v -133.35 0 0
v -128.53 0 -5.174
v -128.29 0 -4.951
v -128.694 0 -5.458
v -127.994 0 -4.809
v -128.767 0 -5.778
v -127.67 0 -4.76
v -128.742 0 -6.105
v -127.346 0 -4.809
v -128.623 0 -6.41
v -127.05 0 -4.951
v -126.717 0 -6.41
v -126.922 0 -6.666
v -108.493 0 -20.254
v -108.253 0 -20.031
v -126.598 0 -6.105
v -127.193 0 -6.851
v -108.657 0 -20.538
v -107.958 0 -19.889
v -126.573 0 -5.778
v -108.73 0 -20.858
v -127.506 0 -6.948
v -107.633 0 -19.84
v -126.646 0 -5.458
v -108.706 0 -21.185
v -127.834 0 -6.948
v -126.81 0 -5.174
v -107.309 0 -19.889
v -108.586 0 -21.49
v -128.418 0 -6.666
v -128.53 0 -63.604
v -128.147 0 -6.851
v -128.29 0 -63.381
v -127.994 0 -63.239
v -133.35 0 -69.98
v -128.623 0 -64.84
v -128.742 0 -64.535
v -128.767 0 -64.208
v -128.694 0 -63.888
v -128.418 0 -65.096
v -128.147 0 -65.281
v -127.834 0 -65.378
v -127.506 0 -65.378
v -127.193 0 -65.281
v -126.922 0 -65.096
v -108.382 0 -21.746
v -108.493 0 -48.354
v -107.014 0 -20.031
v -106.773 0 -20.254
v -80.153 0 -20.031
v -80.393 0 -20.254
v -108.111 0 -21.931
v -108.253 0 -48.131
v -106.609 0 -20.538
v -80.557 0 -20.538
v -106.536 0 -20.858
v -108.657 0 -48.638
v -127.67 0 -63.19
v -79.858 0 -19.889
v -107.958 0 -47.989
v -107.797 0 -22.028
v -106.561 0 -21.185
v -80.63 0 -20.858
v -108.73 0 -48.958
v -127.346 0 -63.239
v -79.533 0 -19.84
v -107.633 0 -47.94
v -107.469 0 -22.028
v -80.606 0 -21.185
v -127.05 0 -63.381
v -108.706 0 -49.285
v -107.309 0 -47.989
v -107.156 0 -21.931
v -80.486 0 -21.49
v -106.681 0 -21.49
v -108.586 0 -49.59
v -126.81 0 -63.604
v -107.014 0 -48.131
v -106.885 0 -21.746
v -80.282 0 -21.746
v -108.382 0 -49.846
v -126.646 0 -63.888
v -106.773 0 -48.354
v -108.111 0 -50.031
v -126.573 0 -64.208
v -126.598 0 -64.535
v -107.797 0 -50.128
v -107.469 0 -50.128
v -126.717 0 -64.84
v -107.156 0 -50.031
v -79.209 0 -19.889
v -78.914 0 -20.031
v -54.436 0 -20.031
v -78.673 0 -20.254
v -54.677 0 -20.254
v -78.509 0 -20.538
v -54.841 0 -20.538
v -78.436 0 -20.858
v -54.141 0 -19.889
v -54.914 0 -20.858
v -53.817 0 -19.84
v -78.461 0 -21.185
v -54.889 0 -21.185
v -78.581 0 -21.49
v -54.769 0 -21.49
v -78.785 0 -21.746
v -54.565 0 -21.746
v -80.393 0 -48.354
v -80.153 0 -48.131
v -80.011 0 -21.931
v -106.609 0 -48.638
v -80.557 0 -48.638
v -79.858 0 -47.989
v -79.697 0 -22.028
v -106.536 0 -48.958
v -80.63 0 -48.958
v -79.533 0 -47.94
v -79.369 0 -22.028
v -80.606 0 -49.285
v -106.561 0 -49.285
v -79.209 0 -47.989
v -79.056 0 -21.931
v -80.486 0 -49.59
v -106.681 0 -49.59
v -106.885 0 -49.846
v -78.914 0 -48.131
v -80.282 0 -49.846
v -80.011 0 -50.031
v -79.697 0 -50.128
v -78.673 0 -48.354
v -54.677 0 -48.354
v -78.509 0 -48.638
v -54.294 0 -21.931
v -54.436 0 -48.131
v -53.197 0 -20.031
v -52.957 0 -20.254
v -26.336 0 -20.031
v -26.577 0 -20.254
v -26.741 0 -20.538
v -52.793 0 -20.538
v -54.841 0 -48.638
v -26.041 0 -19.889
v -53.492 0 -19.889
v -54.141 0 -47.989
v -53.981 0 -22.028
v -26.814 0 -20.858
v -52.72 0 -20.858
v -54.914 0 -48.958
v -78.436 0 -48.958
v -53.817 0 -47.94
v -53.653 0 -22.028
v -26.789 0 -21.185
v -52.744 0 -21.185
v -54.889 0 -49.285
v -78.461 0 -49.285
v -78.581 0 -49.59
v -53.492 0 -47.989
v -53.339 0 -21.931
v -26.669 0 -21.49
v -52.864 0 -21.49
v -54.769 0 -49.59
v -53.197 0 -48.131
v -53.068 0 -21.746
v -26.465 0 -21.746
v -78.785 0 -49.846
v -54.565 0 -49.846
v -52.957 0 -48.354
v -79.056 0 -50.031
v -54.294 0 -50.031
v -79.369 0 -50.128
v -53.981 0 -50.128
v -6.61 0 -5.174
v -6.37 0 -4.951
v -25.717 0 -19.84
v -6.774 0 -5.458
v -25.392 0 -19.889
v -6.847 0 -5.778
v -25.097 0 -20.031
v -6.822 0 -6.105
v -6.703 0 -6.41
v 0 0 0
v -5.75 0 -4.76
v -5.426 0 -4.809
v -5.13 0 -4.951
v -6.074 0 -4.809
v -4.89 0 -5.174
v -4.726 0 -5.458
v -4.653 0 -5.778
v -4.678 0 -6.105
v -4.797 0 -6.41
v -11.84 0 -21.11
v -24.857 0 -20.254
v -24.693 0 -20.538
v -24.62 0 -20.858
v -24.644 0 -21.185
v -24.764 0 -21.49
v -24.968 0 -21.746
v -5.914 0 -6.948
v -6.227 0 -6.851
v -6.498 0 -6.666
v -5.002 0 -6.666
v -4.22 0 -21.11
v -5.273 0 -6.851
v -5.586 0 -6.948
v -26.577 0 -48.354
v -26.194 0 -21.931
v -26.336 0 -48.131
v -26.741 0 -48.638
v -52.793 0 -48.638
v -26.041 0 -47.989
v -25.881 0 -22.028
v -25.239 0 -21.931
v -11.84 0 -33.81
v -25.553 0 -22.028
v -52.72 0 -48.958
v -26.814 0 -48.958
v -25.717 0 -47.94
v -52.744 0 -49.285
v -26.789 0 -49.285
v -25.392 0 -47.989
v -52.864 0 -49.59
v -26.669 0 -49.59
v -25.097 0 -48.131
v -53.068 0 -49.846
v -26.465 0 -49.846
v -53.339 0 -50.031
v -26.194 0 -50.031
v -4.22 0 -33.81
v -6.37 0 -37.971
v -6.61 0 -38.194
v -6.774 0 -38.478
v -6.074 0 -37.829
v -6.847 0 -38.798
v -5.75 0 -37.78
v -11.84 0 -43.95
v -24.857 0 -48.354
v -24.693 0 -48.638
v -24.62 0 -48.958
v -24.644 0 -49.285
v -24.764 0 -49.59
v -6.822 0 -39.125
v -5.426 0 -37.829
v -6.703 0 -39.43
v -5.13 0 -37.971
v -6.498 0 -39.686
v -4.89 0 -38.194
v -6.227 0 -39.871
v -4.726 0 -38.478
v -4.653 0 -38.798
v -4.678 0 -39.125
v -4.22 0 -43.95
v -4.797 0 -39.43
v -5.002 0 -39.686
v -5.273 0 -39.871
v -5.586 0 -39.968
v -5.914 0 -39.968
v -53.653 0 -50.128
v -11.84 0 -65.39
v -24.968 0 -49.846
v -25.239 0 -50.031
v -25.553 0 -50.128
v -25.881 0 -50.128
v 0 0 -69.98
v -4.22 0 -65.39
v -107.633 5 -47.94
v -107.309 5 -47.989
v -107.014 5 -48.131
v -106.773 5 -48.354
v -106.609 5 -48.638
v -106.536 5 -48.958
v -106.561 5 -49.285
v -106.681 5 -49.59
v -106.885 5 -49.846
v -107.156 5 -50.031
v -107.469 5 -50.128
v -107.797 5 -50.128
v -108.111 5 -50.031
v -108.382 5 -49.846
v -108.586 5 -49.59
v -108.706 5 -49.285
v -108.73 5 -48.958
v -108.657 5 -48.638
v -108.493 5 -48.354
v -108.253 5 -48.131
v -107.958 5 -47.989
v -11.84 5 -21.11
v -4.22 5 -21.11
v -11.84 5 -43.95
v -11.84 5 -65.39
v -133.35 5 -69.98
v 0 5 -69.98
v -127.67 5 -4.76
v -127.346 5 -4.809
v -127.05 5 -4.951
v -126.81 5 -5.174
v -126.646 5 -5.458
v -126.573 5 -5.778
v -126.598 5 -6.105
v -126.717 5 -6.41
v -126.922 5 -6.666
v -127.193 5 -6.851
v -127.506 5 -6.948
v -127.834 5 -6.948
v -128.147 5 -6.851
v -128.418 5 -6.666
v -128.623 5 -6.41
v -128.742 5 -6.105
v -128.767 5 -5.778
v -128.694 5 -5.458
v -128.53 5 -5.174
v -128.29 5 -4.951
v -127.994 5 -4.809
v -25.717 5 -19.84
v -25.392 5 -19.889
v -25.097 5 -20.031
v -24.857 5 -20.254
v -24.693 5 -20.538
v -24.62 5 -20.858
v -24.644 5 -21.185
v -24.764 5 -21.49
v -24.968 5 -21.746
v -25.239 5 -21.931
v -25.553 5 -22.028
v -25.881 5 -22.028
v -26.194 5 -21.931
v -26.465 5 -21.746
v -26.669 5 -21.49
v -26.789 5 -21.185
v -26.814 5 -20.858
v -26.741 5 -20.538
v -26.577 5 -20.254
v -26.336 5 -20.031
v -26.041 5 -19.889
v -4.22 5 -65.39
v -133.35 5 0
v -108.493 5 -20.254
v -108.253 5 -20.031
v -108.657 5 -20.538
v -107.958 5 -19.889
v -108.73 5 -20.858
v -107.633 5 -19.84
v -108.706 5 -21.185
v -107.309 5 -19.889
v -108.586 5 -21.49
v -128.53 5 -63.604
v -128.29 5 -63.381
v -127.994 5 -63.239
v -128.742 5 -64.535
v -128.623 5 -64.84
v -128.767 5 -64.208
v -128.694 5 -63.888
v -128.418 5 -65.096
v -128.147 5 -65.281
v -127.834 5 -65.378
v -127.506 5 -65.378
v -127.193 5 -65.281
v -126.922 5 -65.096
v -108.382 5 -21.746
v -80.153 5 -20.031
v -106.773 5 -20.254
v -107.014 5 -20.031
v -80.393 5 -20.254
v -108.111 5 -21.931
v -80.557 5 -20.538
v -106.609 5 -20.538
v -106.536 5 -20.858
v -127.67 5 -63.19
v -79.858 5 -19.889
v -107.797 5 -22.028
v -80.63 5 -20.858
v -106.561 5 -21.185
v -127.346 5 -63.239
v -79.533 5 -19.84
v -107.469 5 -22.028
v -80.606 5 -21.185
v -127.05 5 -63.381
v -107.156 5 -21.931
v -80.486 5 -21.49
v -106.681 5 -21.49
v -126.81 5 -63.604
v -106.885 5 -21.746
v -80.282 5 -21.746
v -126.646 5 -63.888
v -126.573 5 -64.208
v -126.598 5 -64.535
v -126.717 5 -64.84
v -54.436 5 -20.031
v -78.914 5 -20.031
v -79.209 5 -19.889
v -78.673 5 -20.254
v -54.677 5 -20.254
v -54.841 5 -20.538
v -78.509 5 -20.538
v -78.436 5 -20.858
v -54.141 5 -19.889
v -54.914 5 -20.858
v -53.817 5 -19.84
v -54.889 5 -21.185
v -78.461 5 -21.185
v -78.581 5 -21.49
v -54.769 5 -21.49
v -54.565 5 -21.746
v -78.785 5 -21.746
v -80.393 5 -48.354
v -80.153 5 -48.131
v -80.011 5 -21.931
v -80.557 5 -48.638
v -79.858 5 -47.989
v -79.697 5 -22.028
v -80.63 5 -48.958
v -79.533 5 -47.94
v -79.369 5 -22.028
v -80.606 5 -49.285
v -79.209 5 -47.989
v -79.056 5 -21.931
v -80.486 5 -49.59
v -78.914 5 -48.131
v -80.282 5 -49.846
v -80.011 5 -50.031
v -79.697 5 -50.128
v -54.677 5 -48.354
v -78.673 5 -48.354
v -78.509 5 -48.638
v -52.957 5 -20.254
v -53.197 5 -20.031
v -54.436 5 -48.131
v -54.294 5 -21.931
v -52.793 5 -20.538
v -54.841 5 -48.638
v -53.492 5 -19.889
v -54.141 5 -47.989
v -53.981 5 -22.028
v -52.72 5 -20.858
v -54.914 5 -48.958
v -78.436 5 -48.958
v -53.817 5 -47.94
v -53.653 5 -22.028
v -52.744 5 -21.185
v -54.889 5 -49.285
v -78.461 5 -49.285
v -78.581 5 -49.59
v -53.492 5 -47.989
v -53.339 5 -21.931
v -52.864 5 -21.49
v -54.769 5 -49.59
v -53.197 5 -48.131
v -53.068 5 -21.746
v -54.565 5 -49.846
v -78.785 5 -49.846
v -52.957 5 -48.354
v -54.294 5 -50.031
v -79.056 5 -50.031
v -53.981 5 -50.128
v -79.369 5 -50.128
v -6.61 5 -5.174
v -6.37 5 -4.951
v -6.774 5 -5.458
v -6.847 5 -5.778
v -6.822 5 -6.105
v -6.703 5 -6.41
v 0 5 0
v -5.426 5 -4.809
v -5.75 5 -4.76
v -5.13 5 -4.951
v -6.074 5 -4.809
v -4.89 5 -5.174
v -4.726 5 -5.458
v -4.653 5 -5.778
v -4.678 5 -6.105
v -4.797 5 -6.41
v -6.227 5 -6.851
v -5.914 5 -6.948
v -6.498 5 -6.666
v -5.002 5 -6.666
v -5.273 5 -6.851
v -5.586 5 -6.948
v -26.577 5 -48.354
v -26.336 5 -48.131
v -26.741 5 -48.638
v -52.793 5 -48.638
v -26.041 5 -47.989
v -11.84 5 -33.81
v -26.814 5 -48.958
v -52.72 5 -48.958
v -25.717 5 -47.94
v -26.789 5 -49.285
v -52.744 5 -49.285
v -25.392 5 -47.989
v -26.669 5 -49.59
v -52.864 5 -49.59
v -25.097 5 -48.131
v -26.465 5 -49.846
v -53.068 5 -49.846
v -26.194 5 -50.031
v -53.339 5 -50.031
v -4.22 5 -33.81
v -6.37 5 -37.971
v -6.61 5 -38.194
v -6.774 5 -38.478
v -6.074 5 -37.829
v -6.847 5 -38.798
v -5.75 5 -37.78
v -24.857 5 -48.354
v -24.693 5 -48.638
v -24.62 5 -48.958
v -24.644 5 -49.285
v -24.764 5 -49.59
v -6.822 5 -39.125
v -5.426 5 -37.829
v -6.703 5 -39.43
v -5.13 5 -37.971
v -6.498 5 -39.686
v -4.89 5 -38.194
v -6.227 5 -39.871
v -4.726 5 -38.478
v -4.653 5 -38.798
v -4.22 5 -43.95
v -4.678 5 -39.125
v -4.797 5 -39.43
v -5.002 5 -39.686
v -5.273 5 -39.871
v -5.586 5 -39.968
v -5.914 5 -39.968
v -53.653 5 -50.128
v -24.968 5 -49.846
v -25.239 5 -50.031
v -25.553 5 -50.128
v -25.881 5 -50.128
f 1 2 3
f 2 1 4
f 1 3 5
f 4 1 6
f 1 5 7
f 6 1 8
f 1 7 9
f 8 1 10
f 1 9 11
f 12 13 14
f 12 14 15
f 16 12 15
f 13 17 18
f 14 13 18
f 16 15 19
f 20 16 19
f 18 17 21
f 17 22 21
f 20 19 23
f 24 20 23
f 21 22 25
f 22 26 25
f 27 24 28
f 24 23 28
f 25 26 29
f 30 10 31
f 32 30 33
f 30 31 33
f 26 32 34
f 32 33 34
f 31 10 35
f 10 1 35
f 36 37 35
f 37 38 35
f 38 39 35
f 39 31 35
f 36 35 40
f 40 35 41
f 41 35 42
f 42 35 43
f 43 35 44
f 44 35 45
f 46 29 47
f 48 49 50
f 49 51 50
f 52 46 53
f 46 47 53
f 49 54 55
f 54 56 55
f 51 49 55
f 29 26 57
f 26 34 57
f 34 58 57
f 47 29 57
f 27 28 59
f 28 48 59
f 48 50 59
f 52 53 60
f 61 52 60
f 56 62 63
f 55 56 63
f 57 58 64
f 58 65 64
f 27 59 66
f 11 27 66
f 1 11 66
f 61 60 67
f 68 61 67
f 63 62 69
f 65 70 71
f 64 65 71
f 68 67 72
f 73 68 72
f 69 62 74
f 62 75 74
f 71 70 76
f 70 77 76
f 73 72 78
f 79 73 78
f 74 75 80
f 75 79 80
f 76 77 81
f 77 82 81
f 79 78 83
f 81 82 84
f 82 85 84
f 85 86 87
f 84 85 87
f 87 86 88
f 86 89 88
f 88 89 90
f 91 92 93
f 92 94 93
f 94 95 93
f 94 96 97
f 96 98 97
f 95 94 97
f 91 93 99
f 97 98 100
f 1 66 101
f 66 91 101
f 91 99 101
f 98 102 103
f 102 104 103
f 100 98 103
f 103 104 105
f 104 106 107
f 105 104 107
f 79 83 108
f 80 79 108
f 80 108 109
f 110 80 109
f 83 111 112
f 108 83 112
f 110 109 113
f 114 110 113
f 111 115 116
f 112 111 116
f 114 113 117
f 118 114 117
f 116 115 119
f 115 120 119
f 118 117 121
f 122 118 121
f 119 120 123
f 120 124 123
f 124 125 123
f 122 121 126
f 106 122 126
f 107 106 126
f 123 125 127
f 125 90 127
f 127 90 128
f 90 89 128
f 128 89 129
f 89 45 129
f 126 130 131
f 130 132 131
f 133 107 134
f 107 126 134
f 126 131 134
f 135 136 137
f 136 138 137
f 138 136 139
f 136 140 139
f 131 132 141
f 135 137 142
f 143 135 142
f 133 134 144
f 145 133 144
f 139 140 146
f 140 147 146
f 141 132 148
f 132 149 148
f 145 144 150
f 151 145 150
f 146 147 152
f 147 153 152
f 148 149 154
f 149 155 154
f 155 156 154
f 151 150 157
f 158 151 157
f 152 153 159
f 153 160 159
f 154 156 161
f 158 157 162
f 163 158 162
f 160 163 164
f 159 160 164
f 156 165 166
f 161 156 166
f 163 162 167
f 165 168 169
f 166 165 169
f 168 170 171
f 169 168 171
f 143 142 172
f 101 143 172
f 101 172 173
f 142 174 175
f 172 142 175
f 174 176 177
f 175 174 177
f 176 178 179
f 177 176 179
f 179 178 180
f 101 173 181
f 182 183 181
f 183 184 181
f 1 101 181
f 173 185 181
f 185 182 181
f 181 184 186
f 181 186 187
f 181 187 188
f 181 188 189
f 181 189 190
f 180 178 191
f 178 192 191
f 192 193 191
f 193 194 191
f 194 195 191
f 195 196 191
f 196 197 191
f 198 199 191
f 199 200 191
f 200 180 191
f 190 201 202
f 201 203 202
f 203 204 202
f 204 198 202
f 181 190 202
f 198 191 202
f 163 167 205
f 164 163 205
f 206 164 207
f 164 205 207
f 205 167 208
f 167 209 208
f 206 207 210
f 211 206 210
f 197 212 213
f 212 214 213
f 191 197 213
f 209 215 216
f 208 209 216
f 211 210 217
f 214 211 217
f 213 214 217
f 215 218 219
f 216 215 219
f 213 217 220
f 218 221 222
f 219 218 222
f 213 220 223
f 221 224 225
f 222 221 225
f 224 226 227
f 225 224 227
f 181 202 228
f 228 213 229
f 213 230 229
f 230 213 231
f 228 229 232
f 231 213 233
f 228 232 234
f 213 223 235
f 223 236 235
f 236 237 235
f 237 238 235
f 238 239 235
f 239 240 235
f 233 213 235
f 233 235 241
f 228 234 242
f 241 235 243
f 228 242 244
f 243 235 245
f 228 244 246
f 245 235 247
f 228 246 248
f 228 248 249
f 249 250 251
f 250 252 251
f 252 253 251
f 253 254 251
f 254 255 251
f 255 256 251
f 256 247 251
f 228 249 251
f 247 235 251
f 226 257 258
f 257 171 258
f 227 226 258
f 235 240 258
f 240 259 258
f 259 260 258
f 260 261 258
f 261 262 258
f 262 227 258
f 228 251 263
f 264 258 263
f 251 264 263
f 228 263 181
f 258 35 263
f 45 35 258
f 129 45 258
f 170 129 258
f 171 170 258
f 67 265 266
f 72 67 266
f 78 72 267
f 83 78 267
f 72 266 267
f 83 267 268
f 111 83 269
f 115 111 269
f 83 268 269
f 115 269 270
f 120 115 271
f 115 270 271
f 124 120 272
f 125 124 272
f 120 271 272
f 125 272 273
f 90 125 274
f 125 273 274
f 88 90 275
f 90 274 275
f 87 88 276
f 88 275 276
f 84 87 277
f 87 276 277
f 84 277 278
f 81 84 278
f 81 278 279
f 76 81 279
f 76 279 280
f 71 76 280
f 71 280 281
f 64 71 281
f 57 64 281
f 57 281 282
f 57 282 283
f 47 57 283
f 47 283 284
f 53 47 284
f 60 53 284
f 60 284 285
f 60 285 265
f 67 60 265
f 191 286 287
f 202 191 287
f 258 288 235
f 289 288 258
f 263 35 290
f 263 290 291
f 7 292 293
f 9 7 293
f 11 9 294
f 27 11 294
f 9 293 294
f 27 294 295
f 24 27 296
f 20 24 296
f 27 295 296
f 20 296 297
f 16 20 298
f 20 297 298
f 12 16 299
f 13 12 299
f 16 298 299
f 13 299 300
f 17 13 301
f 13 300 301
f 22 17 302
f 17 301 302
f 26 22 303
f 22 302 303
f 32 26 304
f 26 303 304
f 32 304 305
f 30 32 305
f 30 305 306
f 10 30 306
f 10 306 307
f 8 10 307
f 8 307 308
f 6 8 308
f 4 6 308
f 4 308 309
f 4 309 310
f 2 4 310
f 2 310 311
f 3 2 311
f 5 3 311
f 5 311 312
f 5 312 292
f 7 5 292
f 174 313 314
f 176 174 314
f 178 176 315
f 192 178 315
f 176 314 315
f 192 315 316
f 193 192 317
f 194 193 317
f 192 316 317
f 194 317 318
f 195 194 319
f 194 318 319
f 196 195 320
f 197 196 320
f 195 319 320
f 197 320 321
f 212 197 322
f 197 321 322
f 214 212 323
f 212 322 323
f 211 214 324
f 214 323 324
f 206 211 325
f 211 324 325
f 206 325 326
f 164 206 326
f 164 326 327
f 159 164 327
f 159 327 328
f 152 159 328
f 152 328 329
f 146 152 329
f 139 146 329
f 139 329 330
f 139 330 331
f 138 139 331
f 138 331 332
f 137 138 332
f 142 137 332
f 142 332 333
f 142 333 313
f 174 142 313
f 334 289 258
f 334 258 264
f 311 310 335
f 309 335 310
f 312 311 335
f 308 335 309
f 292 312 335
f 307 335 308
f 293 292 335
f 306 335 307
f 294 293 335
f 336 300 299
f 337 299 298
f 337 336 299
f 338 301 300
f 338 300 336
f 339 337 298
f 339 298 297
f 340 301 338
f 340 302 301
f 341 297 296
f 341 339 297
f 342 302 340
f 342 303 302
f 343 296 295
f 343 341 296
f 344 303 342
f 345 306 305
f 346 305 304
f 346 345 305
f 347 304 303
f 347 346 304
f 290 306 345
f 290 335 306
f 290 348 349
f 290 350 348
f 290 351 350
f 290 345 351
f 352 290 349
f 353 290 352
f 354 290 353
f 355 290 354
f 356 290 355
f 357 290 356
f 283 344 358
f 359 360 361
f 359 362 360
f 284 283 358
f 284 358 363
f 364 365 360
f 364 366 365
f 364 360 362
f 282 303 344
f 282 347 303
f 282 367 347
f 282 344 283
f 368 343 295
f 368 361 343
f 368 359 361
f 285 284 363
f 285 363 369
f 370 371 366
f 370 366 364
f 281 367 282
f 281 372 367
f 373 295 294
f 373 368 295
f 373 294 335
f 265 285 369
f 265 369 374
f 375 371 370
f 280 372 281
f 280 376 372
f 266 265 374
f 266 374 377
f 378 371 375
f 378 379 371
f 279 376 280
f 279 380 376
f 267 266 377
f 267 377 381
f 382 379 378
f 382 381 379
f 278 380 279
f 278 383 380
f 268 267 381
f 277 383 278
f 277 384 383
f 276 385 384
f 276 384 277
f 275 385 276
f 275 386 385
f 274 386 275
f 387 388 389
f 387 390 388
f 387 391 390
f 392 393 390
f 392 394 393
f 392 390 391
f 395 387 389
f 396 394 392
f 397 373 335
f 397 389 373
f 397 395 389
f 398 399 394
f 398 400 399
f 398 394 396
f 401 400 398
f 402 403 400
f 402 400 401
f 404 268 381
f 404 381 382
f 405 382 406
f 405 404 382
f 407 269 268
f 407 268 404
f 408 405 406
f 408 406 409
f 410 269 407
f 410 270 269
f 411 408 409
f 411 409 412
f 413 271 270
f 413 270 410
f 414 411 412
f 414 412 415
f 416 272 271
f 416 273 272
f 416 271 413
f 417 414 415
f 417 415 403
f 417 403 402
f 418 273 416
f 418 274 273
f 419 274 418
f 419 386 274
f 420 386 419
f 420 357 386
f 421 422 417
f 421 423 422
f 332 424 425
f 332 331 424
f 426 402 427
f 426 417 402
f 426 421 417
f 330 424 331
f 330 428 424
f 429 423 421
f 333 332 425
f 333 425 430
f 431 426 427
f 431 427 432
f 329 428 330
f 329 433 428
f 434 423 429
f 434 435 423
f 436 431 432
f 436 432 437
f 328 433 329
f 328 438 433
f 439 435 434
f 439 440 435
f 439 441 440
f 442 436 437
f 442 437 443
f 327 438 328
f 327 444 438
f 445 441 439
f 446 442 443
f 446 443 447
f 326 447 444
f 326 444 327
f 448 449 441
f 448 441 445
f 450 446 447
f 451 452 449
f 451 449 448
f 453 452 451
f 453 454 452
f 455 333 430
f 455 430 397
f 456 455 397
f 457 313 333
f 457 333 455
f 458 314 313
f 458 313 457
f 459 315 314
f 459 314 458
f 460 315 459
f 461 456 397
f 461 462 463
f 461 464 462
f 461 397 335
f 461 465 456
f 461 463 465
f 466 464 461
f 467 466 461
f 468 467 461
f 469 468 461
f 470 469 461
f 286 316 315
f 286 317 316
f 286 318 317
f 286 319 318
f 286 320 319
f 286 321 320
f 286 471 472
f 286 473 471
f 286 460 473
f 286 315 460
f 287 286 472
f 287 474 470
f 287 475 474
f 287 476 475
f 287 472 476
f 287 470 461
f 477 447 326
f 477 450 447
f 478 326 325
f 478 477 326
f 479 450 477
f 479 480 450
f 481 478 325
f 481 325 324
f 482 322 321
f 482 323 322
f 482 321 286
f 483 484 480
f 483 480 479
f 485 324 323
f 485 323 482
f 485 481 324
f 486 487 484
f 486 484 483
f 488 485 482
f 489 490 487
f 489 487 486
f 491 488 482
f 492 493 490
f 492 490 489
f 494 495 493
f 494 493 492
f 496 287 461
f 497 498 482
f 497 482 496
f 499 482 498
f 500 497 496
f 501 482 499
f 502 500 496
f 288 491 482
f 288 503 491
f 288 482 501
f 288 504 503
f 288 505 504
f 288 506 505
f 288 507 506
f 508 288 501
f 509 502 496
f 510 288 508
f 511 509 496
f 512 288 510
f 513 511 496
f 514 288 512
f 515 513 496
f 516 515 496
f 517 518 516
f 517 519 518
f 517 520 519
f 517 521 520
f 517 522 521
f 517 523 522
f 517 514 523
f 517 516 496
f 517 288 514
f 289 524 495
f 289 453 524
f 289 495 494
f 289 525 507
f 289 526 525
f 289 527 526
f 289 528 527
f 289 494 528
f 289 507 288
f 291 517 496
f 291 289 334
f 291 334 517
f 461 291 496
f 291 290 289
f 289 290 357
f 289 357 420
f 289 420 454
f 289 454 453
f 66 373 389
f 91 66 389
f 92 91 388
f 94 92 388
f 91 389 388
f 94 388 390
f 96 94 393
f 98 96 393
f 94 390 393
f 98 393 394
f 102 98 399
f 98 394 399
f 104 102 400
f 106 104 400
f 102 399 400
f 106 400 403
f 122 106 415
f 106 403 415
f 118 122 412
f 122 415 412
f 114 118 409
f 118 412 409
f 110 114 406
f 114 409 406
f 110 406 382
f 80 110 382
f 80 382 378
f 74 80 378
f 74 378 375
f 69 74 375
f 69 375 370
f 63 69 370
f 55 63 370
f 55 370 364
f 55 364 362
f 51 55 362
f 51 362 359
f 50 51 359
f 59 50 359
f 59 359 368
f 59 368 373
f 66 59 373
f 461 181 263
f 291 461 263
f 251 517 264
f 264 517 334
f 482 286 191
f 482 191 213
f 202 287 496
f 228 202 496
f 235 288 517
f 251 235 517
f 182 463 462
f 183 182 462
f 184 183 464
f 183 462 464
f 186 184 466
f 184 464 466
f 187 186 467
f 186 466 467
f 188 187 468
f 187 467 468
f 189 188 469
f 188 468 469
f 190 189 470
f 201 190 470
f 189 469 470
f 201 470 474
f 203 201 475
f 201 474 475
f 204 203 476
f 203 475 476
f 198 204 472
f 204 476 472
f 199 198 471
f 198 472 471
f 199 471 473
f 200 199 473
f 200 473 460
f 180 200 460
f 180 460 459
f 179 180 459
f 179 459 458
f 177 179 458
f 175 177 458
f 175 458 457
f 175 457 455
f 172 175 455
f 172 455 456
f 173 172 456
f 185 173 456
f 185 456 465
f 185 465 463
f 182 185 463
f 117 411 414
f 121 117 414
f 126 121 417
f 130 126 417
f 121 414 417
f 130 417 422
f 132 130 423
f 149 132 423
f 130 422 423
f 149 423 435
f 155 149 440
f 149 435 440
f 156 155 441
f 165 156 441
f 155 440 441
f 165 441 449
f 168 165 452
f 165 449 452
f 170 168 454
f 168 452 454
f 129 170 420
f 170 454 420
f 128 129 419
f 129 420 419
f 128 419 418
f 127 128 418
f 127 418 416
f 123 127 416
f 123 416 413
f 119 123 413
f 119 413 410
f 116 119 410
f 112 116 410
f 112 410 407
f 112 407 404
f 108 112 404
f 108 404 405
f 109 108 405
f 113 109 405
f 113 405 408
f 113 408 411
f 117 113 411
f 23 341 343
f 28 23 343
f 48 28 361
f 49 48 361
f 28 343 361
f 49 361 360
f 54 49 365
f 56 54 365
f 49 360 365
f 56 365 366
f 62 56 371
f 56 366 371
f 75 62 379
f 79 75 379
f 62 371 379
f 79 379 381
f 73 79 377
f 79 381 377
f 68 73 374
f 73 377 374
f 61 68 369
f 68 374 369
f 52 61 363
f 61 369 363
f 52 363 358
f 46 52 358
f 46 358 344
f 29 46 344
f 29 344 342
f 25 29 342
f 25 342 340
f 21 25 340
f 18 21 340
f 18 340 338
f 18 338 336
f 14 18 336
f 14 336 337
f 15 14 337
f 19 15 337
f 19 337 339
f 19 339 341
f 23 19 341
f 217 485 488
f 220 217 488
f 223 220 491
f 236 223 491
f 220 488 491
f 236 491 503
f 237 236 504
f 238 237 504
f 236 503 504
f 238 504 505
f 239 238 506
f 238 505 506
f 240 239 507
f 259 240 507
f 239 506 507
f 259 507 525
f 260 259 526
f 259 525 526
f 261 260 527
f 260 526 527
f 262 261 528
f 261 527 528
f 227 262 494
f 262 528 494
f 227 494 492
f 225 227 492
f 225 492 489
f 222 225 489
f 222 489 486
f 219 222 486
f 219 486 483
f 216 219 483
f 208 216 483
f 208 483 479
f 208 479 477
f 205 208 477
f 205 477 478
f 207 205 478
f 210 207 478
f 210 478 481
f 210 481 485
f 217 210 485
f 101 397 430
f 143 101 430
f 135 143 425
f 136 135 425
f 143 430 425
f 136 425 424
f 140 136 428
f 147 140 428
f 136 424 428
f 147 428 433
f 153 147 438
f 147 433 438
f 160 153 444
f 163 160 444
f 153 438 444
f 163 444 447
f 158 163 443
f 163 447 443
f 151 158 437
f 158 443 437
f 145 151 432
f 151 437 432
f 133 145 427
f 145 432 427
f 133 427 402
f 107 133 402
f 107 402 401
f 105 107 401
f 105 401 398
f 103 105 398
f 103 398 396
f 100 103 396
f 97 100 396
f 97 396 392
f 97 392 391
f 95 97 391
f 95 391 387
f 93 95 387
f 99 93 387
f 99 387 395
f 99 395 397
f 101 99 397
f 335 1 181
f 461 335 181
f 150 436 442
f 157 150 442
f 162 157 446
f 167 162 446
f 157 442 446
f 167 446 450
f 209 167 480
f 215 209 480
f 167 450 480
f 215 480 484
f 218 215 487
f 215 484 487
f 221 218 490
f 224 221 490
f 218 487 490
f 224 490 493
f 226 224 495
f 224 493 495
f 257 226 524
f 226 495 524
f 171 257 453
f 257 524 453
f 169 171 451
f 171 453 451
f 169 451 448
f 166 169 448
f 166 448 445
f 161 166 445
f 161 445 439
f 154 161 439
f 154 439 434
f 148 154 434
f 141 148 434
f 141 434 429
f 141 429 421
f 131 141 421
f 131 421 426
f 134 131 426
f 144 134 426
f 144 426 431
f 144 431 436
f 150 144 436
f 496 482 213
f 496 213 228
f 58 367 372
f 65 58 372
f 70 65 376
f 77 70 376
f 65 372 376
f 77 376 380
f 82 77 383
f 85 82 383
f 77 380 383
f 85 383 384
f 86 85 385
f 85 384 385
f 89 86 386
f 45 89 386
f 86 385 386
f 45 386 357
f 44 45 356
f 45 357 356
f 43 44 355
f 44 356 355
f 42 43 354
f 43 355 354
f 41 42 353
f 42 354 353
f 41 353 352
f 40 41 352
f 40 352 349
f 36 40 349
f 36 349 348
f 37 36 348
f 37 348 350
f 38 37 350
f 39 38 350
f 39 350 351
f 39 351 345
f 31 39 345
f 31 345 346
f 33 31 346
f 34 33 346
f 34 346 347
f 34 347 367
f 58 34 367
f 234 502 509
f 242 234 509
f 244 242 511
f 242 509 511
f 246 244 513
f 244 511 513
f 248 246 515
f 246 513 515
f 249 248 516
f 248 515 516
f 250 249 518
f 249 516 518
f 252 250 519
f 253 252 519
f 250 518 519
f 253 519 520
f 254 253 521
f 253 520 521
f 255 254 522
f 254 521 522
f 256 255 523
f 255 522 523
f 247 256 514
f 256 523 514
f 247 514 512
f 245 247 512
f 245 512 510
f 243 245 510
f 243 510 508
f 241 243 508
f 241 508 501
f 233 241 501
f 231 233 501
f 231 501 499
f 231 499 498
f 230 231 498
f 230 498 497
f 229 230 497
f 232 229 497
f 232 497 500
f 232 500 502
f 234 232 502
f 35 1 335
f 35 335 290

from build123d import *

# Parameters (mm, degrees)
SKETCH1_W                   = 133.35
SKETCH1_H                   = 69.98
PLATFORM_THICKNESS_DEPTH    = 5
SKETCH2_R                   = 1.1
MOUNTING_HOLES_1_DEPTH      = 151.679868927
SKETCH4_R                   = 1.1
MOUNTING_HOLES_2_DEPTH      = 151.679868927
SKETCH3_W                   = 7.62
SKETCH3_H                   = 12.7
SKETCH3_H_2                 = 21.44
CABLE_MANAGEMENT_HOLE_DEPTH = 151.679868927


with BuildPart() as part:
    # Sketch1 → platform_thickness (new body)
    with BuildSketch(Plane(origin=(0, 0, 0), x_dir=(1, 0, 0), z_dir=(0, 1, 0))):
        with Locations((-66.675, 34.99)):
            Rectangle(SKETCH1_W, SKETCH1_H)
    extrude(amount=PLATFORM_THICKNESS_DEPTH)

    # Sketch2 → mounting_holes_1 (cut, through all)
    with BuildSketch(Plane(origin=(0, 5, 0), x_dir=(1, 0, 0), z_dir=(0, 1, 0))):
        with Locations(Location((-5.75, 38.88, 0), (0, 0, 270))):
            Circle(SKETCH2_R)
        with Locations(Location((-5.75, 5.86, 0), (0, 0, 270))):
            Circle(SKETCH2_R)
        with Locations(Location((-127.67, 5.86, 0), (0, 0, 270))):
            Circle(SKETCH2_R)
        with Locations(Location((-127.67, 64.29, 0), (0, 0, 270))):
            Circle(SKETCH2_R)
    extrude(amount=-MOUNTING_HOLES_1_DEPTH, mode=Mode.SUBTRACT)

    # Sketch4 → mounting_holes_2 (cut, through all)
    with BuildSketch(Plane(origin=(0, 5, 0), x_dir=(1, 0, 0), z_dir=(0, 1, 0))):
        with Locations(Location((-25.716666667, 49.04, 0), (0, 0, 270))):
            Circle(SKETCH4_R)
        with Locations(Location((-25.716666667, 20.94, 0), (0, 0, 270))):
            Circle(SKETCH4_R)
        with Locations(Location((-53.816666667, 49.04, 0), (0, 0, 270))):
            Circle(SKETCH4_R)
        with Locations(Location((-53.816666667, 20.94, 0), (0, 0, 270))):
            Circle(SKETCH4_R)
        with Locations(Location((-79.533333333, 49.04, 0), (0, 0, 270))):
            Circle(SKETCH4_R)
        with Locations(Location((-79.533333333, 20.94, 0), (0, 0, 270))):
            Circle(SKETCH4_R)
        with Locations(Location((-107.633333333, 49.04, 0), (0, 0, 270))):
            Circle(SKETCH4_R)
        with Locations(Location((-107.633333333, 20.94, 0), (0, 0, 270))):
            Circle(SKETCH4_R)
    extrude(amount=-MOUNTING_HOLES_2_DEPTH, mode=Mode.SUBTRACT)

    # Sketch3 → cable_management_hole (cut, through all)
    with BuildSketch(Plane(origin=(0, 5, 0), x_dir=(1, 0, 0), z_dir=(0, 1, 0))):
        with Locations((-8.03, 27.46)):
            Rectangle(SKETCH3_W, SKETCH3_H)
        with Locations((-8.03, 54.67)):
            Rectangle(SKETCH3_W, SKETCH3_H_2)
    extrude(amount=-CABLE_MANAGEMENT_HOLE_DEPTH, mode=Mode.SUBTRACT)


solid = part.part
